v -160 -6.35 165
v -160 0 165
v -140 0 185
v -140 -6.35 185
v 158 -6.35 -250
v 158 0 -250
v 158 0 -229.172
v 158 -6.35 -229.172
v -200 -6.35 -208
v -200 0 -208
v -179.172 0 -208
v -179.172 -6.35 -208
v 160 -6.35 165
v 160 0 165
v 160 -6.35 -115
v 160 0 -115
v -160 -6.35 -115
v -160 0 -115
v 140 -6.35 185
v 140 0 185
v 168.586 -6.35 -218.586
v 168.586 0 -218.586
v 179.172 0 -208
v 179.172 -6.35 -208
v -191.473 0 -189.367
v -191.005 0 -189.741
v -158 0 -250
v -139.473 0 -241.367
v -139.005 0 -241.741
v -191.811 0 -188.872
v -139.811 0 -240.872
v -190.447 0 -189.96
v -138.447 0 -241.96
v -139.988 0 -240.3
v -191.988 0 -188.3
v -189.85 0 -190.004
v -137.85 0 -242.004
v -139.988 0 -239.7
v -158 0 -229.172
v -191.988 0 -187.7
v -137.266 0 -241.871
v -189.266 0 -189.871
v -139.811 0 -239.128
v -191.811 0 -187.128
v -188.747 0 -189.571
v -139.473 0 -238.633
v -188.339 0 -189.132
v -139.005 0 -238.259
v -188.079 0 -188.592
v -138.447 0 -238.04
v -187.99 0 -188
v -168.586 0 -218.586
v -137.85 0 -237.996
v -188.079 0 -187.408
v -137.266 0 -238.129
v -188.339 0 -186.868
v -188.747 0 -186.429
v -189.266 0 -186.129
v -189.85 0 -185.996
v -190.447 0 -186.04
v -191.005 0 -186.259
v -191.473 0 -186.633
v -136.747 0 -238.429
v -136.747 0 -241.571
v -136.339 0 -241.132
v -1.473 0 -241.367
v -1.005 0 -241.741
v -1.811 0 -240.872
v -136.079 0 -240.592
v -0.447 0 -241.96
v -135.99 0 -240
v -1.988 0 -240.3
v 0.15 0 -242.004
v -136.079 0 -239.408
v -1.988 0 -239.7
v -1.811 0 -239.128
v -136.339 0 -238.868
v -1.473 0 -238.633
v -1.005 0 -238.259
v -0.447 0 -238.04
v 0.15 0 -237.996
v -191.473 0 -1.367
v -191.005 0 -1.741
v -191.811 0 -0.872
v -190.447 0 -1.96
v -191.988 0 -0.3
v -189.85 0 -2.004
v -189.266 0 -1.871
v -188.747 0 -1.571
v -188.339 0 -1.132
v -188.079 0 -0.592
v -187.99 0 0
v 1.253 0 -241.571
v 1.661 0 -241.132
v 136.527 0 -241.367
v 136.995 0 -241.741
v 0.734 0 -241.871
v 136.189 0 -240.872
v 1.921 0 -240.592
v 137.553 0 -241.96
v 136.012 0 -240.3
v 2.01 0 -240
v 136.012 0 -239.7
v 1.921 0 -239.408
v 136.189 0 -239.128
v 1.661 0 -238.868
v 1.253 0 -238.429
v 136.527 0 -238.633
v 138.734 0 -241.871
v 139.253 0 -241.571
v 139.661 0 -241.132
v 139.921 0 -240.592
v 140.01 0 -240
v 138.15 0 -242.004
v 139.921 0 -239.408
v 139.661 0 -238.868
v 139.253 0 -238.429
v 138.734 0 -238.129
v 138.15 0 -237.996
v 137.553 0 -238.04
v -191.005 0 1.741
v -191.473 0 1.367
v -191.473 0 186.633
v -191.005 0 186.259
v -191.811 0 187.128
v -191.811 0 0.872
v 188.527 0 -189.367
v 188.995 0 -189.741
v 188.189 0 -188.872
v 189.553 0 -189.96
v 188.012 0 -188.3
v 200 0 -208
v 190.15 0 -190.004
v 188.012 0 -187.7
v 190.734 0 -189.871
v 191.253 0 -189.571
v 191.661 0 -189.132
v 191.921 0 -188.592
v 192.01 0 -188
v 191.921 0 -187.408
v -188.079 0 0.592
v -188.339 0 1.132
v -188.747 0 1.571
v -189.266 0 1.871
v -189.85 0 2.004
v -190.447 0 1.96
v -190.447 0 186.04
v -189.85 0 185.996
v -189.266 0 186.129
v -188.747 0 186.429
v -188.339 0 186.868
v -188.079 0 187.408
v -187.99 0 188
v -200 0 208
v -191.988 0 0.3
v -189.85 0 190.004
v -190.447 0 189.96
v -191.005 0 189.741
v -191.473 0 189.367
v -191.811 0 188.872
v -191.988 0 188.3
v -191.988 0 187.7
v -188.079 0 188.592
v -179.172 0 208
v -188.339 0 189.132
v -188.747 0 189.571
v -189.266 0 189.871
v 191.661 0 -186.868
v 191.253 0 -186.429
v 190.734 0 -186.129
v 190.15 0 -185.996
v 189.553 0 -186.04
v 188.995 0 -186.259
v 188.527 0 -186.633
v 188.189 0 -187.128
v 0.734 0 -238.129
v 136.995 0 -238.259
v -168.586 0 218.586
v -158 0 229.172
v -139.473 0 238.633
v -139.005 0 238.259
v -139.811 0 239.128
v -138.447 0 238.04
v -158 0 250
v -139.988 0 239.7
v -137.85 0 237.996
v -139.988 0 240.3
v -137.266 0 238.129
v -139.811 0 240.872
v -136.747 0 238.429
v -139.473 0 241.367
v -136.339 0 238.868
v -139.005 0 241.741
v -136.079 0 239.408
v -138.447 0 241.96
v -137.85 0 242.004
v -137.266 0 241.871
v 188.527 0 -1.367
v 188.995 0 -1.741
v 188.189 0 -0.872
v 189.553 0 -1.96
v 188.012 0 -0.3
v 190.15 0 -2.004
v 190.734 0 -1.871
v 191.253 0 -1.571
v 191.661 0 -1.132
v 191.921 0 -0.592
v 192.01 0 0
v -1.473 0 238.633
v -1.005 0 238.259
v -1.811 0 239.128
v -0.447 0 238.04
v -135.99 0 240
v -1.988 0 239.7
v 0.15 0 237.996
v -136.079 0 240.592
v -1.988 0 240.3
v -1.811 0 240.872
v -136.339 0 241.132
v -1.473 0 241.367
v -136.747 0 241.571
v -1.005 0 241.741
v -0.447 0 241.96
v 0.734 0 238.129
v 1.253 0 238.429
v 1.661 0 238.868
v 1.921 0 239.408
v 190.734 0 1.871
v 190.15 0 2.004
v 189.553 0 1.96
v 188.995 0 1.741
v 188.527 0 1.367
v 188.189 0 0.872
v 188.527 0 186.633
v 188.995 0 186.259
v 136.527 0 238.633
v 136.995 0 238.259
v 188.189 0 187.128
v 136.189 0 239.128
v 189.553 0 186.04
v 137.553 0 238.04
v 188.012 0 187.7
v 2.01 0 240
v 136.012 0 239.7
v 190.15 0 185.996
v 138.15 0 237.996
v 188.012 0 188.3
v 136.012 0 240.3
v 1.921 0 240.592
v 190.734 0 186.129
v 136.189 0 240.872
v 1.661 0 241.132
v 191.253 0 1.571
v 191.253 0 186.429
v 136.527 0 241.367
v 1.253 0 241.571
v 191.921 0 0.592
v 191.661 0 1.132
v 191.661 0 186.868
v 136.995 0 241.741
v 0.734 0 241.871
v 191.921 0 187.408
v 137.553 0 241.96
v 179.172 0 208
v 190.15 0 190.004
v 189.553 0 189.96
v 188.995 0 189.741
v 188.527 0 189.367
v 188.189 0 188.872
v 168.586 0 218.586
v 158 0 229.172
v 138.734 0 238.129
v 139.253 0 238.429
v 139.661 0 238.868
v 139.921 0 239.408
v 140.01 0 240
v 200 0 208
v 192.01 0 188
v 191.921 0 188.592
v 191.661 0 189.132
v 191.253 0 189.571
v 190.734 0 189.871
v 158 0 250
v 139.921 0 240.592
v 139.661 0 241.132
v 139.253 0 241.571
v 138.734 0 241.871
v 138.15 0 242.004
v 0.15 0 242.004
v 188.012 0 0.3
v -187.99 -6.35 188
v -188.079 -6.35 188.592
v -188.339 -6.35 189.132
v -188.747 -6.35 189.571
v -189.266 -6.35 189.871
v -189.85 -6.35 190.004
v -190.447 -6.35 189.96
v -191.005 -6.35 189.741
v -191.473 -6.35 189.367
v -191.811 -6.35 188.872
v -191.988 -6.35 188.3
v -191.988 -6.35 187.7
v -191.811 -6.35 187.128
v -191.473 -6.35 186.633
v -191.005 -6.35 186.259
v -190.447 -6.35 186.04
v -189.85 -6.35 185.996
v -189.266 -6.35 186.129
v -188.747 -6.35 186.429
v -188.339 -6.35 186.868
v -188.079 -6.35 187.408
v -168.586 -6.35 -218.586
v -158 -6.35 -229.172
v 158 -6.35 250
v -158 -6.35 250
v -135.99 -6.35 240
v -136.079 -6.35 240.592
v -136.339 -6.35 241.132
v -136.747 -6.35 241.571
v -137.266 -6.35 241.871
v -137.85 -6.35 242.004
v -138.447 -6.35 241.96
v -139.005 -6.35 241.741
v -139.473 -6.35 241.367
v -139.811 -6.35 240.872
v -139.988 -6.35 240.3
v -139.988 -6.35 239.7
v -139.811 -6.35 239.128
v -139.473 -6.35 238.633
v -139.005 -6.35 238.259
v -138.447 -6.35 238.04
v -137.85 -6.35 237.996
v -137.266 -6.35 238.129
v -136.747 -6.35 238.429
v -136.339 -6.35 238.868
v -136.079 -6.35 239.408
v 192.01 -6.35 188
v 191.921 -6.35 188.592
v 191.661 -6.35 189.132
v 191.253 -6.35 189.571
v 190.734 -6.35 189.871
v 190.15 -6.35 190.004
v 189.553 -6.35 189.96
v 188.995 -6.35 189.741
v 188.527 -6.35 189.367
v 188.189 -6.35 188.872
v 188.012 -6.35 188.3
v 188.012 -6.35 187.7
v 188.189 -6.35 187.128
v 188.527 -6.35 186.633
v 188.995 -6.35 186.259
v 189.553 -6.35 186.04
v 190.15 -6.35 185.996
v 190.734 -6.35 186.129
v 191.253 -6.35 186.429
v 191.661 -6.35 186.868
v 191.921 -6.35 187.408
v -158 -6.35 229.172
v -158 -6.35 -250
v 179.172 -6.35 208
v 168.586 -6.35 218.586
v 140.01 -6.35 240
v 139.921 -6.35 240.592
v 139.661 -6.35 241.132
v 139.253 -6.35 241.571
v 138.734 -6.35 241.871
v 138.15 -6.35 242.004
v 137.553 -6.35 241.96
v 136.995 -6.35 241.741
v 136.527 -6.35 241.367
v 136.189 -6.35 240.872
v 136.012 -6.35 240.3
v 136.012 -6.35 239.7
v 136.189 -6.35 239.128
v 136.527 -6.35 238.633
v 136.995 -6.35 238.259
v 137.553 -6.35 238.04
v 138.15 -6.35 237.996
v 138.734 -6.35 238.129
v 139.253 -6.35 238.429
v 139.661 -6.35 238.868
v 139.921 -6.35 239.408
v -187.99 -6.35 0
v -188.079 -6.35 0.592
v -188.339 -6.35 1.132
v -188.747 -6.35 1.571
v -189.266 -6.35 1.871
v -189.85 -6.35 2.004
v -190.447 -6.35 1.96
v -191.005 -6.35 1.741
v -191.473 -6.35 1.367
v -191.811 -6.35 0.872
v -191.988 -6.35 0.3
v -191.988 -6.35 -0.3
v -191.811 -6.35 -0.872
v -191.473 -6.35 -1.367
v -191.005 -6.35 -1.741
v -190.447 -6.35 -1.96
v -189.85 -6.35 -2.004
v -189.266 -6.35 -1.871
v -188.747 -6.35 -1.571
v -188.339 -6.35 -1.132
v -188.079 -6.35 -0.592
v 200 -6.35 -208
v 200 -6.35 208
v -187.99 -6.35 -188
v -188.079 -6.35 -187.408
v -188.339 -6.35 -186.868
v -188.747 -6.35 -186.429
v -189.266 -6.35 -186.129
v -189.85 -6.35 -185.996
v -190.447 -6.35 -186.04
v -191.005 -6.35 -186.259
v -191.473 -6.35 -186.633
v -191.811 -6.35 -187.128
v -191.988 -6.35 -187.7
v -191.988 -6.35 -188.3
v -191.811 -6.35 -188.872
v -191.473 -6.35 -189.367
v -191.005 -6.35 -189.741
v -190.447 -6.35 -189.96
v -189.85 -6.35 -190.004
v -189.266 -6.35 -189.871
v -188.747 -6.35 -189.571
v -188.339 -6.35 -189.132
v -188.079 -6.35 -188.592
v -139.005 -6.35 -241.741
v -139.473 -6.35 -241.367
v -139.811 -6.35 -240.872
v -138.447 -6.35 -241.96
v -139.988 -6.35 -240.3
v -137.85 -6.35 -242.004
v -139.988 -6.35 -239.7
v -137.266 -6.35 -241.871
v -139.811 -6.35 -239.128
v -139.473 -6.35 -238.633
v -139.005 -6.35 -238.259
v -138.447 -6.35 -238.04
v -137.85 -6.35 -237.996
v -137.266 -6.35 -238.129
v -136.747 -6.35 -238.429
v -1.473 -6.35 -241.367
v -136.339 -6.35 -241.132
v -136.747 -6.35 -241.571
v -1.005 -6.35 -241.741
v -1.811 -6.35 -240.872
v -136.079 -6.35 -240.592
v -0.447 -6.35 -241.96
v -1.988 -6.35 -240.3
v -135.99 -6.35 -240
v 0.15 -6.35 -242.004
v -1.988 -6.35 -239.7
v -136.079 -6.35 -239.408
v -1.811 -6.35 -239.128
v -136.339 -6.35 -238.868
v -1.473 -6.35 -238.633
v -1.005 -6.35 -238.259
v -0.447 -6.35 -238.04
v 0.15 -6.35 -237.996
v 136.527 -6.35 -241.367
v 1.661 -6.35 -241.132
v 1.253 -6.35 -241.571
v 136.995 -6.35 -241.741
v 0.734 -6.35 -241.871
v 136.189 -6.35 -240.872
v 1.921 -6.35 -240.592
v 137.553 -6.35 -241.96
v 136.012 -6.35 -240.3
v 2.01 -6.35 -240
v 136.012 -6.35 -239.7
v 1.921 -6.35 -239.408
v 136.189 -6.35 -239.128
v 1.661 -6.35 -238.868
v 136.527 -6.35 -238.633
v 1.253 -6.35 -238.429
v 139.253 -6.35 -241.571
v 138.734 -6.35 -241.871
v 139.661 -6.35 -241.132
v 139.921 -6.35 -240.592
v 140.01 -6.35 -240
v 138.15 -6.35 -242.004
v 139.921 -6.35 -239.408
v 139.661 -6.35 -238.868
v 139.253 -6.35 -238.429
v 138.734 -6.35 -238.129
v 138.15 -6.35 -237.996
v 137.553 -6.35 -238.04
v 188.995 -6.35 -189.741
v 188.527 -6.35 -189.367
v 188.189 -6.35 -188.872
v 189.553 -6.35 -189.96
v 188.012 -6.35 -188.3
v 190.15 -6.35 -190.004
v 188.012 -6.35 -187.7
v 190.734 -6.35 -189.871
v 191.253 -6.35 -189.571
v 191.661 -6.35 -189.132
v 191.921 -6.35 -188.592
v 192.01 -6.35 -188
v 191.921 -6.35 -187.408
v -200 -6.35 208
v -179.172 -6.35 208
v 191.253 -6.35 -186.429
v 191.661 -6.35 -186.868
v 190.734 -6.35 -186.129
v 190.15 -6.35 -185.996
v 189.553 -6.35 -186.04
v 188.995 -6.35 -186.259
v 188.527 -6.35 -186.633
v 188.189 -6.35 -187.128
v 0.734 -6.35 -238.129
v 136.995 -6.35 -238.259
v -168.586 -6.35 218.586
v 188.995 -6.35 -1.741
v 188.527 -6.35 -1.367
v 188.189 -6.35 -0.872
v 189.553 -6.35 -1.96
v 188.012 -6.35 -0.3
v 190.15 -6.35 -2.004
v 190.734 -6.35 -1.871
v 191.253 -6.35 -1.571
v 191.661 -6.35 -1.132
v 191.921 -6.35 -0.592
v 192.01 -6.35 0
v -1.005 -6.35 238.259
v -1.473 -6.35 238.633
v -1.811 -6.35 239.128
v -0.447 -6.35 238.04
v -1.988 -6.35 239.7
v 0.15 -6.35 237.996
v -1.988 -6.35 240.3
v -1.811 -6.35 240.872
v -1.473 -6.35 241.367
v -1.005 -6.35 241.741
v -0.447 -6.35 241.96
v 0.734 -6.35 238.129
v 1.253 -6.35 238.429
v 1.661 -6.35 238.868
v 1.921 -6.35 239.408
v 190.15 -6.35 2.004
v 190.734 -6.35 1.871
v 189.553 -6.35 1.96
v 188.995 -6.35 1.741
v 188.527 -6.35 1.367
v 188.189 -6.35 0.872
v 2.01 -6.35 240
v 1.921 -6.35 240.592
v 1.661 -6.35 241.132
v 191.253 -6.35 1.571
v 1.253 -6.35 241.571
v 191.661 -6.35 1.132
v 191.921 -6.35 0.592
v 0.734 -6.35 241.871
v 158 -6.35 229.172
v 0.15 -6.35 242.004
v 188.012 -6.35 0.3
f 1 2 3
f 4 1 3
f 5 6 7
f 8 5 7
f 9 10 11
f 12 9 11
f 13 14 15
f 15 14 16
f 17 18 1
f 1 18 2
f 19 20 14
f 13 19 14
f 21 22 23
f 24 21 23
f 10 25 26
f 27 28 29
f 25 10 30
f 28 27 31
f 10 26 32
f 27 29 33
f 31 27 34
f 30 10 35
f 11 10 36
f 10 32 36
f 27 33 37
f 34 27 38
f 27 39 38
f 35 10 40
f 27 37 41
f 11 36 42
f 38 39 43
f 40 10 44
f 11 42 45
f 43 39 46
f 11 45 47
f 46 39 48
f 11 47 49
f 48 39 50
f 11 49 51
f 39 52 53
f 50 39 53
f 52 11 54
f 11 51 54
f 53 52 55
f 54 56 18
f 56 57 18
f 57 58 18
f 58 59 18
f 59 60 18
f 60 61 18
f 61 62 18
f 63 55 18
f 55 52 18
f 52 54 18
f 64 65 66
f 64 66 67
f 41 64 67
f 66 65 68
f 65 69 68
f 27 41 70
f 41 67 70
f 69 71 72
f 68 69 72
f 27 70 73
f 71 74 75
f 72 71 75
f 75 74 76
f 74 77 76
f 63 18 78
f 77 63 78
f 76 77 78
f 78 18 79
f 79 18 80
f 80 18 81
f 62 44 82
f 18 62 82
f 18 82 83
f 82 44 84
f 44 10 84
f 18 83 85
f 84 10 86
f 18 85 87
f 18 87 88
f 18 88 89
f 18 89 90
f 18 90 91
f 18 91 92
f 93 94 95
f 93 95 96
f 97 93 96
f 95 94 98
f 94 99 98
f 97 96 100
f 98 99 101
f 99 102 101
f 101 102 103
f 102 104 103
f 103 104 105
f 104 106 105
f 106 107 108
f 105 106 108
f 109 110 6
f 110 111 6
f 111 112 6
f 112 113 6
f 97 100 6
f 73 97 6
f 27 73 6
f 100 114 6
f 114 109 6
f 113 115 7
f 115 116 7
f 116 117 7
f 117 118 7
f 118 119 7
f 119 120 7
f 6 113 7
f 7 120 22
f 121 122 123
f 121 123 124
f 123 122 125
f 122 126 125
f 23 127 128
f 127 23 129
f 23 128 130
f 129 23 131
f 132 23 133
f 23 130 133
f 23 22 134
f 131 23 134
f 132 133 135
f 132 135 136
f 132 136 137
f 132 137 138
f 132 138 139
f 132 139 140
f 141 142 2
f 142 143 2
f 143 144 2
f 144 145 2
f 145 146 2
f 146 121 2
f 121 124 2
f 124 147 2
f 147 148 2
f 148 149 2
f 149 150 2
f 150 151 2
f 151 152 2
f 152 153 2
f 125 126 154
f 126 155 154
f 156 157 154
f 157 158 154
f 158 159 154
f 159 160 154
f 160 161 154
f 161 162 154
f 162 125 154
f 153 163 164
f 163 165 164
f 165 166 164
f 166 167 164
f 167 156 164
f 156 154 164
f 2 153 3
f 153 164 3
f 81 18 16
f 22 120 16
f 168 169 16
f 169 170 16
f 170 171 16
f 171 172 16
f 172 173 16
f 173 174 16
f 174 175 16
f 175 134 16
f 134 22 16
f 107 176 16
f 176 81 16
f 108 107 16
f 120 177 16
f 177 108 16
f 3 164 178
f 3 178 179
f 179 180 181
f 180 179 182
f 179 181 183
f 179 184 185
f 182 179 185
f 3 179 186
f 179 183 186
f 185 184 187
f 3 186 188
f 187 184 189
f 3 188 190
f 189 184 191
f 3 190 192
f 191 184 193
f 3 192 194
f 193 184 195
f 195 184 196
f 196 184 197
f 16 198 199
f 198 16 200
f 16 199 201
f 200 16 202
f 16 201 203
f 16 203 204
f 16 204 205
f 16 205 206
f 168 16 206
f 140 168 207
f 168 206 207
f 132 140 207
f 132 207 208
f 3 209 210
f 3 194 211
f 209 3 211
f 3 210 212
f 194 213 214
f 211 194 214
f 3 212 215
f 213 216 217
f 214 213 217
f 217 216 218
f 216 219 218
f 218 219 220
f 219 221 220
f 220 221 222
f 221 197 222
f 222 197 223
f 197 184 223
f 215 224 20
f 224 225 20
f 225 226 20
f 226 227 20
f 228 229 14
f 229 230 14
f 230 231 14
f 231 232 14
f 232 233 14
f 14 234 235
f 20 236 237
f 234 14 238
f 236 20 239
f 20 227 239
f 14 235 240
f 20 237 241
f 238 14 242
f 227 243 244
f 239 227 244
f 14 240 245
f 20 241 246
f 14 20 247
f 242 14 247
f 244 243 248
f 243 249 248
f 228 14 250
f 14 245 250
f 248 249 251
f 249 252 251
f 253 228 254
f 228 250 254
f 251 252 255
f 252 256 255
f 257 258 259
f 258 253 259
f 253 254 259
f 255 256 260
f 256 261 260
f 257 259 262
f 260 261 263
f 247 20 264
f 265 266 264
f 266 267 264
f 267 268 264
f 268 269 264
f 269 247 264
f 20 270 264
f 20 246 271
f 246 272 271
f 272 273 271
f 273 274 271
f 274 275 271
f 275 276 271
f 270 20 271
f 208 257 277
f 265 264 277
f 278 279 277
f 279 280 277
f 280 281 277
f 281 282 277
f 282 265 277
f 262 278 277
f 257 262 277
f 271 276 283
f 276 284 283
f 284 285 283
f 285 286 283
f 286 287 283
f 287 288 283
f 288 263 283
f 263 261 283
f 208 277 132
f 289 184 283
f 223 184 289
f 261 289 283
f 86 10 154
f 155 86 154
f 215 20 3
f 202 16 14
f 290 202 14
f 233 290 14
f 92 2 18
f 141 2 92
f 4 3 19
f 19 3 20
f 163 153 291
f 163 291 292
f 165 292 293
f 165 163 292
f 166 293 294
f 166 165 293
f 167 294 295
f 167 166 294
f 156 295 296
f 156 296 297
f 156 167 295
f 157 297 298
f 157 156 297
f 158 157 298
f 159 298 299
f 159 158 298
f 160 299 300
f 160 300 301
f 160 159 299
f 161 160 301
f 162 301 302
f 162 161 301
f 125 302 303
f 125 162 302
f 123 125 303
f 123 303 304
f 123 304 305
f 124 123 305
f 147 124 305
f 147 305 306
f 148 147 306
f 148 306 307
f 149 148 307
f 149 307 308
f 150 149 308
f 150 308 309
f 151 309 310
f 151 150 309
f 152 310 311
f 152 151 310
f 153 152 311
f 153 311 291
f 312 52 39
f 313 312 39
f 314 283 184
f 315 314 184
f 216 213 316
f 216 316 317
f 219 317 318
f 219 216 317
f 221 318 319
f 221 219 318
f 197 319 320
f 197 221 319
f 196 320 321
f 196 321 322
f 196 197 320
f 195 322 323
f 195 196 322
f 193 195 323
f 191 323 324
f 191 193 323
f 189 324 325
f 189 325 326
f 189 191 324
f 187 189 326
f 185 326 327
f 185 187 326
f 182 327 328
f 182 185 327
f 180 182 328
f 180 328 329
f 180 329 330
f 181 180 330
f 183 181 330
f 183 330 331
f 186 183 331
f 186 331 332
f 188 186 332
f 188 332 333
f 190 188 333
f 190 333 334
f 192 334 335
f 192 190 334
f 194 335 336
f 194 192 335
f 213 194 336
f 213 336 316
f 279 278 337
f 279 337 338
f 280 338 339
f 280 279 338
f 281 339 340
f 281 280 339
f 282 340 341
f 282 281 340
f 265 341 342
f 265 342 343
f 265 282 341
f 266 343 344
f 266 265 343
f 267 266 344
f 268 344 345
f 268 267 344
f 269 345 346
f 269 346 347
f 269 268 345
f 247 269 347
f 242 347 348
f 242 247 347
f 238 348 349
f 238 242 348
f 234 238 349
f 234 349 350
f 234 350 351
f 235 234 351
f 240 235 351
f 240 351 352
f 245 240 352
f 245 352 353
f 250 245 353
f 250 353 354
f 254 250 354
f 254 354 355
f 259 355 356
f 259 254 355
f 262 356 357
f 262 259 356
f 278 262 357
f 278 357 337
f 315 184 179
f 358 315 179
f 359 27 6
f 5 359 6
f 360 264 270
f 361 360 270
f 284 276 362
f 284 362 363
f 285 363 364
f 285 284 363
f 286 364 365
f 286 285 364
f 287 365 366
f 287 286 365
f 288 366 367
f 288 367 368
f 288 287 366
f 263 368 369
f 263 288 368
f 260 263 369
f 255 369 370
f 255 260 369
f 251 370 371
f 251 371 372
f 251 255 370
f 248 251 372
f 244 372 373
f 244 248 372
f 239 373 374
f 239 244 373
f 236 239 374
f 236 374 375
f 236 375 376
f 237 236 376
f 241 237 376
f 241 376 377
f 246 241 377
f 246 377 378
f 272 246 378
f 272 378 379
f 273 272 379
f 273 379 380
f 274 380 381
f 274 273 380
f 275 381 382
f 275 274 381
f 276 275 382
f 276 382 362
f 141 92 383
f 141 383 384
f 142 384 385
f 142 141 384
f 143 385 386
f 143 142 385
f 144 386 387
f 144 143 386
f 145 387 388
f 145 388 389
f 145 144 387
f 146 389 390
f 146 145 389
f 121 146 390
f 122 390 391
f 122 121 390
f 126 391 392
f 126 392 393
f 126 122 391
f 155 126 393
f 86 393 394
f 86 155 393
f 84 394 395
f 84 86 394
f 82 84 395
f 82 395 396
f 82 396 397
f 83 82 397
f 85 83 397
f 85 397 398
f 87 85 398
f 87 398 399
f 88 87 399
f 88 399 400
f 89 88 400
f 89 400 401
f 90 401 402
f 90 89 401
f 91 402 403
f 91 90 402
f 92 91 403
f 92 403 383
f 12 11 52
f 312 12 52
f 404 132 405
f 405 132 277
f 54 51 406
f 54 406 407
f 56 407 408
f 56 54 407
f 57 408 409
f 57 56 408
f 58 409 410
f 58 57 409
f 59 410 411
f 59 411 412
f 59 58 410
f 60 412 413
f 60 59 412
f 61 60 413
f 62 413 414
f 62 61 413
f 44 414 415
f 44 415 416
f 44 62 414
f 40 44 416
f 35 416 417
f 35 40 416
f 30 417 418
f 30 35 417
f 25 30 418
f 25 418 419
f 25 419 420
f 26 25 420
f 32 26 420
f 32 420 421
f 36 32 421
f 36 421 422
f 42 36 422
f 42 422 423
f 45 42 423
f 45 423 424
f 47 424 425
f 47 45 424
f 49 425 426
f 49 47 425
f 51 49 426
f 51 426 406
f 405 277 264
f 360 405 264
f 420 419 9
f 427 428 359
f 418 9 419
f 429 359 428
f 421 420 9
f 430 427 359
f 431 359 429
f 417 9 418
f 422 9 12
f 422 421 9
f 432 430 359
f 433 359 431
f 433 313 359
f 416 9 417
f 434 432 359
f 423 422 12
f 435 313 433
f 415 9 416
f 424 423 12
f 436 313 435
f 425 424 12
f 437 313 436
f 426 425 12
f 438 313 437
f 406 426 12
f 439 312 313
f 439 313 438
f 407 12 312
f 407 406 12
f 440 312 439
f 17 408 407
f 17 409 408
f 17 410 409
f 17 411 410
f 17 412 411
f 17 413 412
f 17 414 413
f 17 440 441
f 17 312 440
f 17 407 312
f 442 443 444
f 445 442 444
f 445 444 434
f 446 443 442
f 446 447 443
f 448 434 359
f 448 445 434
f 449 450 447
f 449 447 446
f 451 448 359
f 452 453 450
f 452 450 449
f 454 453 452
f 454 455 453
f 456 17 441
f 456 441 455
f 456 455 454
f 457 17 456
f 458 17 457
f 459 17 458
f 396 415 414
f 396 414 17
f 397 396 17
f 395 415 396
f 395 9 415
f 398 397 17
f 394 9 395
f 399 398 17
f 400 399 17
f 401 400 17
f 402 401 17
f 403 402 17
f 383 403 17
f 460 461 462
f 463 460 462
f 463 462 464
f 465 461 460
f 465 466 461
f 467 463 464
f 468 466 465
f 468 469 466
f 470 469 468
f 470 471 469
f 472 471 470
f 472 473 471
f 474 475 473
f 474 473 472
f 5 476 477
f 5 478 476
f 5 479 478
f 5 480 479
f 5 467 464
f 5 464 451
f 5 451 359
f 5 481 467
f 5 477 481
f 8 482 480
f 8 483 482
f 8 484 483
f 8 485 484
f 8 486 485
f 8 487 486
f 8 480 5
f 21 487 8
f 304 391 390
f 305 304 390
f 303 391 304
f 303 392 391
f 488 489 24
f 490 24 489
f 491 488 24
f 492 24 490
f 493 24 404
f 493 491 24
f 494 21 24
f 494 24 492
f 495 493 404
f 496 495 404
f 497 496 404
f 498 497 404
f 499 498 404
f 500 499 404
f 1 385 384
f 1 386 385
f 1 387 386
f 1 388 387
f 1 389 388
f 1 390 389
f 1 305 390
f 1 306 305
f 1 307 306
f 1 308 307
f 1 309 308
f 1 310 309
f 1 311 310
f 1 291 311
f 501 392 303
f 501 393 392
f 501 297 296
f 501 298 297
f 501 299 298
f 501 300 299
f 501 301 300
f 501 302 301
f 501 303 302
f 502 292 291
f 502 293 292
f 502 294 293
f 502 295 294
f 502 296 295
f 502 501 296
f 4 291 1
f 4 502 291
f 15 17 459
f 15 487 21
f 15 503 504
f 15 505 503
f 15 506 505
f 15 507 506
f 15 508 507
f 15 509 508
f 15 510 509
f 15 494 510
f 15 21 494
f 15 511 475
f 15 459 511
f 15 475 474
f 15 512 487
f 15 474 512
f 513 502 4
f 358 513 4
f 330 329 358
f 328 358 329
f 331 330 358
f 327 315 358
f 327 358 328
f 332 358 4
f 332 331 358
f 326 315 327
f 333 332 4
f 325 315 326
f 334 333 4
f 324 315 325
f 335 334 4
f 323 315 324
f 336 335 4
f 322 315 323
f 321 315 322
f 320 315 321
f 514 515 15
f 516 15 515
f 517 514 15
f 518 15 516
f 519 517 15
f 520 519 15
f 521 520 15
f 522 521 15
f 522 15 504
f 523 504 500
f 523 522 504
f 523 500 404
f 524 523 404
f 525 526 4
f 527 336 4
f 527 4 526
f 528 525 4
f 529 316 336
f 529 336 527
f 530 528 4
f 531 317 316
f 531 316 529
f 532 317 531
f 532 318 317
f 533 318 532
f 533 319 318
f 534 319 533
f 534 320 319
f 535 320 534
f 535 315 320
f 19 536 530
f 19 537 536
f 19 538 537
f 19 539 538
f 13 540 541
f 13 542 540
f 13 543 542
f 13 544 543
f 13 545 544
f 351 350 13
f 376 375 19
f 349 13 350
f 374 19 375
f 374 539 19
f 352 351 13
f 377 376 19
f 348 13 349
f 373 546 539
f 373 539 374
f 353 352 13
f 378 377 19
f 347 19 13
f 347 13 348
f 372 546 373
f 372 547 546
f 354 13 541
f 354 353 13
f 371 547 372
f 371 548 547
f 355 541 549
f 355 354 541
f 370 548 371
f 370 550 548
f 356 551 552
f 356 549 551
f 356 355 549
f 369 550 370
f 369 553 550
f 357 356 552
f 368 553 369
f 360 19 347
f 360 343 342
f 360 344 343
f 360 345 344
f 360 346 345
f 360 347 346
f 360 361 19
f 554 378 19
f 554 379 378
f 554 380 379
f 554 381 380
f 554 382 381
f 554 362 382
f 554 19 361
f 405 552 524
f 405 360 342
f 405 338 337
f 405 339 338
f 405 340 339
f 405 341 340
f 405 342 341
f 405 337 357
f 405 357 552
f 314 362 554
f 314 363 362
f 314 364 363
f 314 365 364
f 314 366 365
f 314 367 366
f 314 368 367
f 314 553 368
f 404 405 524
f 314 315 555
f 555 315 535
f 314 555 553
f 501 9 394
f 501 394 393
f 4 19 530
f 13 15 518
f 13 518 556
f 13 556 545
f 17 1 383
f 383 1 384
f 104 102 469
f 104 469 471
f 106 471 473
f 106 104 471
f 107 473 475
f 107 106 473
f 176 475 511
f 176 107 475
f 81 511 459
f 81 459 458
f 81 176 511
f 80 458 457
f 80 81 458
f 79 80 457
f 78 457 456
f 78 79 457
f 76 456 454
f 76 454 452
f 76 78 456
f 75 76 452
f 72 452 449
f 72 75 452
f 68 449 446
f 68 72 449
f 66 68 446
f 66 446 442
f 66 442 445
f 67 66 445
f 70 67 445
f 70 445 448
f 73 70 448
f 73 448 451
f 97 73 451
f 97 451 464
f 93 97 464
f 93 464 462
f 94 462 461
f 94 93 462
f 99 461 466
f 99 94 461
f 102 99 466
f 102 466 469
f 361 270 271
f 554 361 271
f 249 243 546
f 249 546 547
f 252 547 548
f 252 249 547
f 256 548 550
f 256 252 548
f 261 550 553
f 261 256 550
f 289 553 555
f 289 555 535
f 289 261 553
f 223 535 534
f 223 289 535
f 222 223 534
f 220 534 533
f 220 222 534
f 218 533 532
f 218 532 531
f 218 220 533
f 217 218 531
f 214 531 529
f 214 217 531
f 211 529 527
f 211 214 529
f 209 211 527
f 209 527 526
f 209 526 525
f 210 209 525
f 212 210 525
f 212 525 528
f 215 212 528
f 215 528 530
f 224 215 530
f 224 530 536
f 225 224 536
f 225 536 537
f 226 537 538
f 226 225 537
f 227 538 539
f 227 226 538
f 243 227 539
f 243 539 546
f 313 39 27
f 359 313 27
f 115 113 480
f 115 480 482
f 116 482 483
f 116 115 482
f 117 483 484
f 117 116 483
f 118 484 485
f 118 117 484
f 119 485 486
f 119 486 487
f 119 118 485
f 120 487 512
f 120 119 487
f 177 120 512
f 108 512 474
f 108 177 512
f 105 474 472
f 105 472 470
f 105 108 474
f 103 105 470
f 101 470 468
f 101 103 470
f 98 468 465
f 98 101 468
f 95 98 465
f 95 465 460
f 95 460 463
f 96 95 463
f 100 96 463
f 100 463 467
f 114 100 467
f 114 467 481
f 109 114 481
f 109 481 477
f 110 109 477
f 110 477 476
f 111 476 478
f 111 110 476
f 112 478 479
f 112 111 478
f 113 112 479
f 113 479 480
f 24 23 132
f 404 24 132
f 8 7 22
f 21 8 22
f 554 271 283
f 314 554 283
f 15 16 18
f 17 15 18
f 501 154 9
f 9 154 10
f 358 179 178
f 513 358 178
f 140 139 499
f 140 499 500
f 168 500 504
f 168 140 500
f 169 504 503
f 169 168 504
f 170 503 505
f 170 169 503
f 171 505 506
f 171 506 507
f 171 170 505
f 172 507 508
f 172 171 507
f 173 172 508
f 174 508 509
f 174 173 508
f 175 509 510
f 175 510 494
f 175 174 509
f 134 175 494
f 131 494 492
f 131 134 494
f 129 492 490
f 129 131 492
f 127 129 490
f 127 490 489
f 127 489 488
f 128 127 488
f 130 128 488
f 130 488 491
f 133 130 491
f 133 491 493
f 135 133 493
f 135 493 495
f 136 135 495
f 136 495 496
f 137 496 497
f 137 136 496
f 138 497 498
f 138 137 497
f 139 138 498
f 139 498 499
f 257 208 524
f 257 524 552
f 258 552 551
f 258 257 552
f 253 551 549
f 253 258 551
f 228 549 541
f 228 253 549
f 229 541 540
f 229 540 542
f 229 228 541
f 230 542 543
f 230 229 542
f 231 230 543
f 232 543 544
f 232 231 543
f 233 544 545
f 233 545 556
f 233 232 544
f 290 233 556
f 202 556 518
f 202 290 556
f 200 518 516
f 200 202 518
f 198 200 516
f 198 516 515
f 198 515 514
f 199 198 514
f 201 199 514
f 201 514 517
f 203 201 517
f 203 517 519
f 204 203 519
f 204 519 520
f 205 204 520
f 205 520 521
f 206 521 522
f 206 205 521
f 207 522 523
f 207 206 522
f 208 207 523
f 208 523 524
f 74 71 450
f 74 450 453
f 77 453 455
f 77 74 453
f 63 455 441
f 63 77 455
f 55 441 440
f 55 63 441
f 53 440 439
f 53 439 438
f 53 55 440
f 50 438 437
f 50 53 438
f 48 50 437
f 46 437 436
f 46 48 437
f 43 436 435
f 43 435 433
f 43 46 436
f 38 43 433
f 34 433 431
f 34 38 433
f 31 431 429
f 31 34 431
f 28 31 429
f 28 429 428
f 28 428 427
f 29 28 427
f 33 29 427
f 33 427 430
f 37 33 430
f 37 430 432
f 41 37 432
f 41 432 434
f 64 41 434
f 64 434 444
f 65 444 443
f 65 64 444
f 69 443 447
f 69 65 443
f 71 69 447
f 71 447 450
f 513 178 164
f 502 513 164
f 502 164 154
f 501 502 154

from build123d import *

# Parameters (mm, degrees)
F0_R     = 2.01
F1_DEPTH = 6.35


with BuildPart() as f1:
    # F0 (on Front) → F1 (new body)
    with BuildSketch(Plane.XZ):
        Polygon((179.1715728753, -208), (190, -208), (200, -208), (200, 208), (190, 208), (179.1715728753, 208), (168.5857864376, 218.5857864376), (158, 229.1715728753), (158, 240), (158, 250), (-158, 250), (-158, 240), (-158, 229.1715728753), (-168.5857864376, 218.5857864376), (-179.1715728753, 208), (-190, 208), (-200, 208), (-200, -208), (-190, -208), (-179.1715728753, -208), (-168.5857864376, -218.5857864376), (-158, -229.1715728753), (-158, -240), (-158, -250), (158, -250), (158, -240), (158, -229.1715728753), (168.5857864376, -218.5857864376), align=None)
        with Locations((-190, -188)):
            Circle(F0_R, mode=Mode.SUBTRACT)
        with Locations((-138, -240)):
            Circle(F0_R, mode=Mode.SUBTRACT)
        with Locations((0, -240)):
            Circle(F0_R, mode=Mode.SUBTRACT)
        with Locations((138, -240)):
            Circle(F0_R, mode=Mode.SUBTRACT)
        with Locations((190, -188)):
            Circle(F0_R, mode=Mode.SUBTRACT)
        with Locations((-190, 0)):
            Circle(F0_R, mode=Mode.SUBTRACT)
        with Locations((-190, 188)):
            Circle(F0_R, mode=Mode.SUBTRACT)
        with Locations((-138, 240)):
            Circle(F0_R, mode=Mode.SUBTRACT)
        Polygon((-140, 185), (140, 185), (160, 165), (160, -115), (0, -115), (-160, -115), (-160, 165), align=None, mode=Mode.SUBTRACT)
        with Locations((190, 0)):
            Circle(F0_R, mode=Mode.SUBTRACT)
        with Locations((0, 240)):
            Circle(F0_R, mode=Mode.SUBTRACT)
        with Locations((138, 240)):
            Circle(F0_R, mode=Mode.SUBTRACT)
        with Locations((190, 188)):
            Circle(F0_R, mode=Mode.SUBTRACT)
    extrude(amount=F1_DEPTH)


solid = f1.part
